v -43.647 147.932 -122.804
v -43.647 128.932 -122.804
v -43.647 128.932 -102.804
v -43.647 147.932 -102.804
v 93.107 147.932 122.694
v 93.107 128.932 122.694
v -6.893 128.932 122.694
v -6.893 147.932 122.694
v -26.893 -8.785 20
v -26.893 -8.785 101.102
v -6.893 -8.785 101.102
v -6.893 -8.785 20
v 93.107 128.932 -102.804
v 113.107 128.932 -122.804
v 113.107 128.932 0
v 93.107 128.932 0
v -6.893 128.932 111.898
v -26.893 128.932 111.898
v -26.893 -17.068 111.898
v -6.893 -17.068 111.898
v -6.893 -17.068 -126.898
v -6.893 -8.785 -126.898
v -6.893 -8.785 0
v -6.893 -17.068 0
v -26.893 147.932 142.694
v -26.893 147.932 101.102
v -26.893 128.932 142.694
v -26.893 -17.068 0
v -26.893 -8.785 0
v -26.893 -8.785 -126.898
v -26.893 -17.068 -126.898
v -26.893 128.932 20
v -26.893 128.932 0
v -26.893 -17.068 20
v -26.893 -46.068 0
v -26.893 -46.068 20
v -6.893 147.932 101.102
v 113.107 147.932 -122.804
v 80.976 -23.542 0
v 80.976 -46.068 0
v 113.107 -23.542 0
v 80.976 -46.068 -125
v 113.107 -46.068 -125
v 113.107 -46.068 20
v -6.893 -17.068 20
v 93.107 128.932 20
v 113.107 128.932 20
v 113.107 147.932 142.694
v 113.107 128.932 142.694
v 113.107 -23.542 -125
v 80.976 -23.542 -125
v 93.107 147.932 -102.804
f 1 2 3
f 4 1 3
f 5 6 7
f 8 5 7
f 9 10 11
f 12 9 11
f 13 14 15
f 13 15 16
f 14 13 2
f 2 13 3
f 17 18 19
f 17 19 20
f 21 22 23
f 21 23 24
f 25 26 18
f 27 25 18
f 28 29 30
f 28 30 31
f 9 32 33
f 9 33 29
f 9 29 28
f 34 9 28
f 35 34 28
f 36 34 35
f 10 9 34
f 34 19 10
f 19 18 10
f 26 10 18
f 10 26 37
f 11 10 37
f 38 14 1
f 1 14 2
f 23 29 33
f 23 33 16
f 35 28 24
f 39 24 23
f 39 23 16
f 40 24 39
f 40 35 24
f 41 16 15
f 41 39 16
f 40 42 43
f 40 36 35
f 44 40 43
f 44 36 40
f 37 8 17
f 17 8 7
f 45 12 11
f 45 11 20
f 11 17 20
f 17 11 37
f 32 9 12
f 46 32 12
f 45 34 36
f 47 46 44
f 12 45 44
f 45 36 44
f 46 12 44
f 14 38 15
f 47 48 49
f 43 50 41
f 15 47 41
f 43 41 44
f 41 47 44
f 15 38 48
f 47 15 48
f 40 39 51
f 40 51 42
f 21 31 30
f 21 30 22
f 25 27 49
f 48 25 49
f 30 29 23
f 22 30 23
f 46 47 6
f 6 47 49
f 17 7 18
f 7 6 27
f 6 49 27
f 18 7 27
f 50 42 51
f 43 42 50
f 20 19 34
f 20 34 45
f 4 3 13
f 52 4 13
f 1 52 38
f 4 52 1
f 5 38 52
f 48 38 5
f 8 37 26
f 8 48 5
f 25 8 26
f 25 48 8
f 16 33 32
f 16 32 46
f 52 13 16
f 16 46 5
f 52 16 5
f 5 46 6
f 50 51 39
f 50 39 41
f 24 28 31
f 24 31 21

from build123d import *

# Parameters (mm, degrees)
F0_W      = 140
F0_H      = 150
F1_DEPTH  = 20
F2_DEPTH  = 25
F4_DEPTH  = 19
F5_W      = 20
F5_H      = 10.7958046891
F6_DEPTH  = 146
F7_W      = 32.1311553568
F7_H      = 22.5257221609
F8_DEPTH  = 125
F9_W      = 20
F9_H      = 8.2833381355
F10_DEPTH = 228


with BuildPart() as f1:
    # F0 (on Top) → F1 (new body)
    with BuildSketch(Plane.XY):
        with Locations((43.1068145484, 28.9318494499)):
            Rectangle(F0_W, F0_H)
    extrude(amount=F1_DEPTH)

    # F2 (add): a face of the model
    f2_faces = [f1.faces().sort_by_distance(p)[0] for p in [
        (43.1068145484, 103.9318494499, 10),
    ]]
    extrude(f2_faces, amount=F2_DEPTH)

    # F3 (on face) → F4 (join)
    with BuildSketch(Plane(origin=(0, 128.9318494499, 0), x_dir=(-1, 0, 0), z_dir=(0, 1, 0))):
        Polygon((6.8931854516, 101.1020294233), (26.8931854516, 101.1020294233), (26.8931854516, 142.6936388016), (-113.1068145484, 142.6936388016), (-113.1068145484, -122.8044226003), (43.6474412288, -122.8044226003), (43.6474412288, -102.8044226003), (-93.1068145484, -102.8044226003), (-93.1068145484, 122.6936388016), (6.8931854516, 122.6936388016), align=None)
    extrude(amount=F4_DEPTH)

    # F5 (on face) → F6 (join)
    with BuildSketch(Plane.XZ.offset(-128.9318494499)):
        with Locations((-16.8931854516, 106.4999317679)):
            Rectangle(F5_W, F5_H)
    extrude(amount=F6_DEPTH)

    # F7 (on face) → F8 (join)
    with BuildSketch(Plane(origin=(0, 0, 0), x_dir=(1, 0, 0), z_dir=(0, 0, -1))):
        with Locations((97.04123687, 34.8052894697)):
            Rectangle(F7_W, F7_H)
    extrude(amount=F8_DEPTH)

    # F9 (on face) → F10 (join)
    with BuildSketch(Plane(origin=(0, 0, 101.1020294233), x_dir=(1, 0, 0), z_dir=(0, 0, -1))):
        with Locations((-16.8931854516, 12.9264814824)):
            Rectangle(F9_W, F9_H)
    extrude(amount=F10_DEPTH)


solid = f1.part
